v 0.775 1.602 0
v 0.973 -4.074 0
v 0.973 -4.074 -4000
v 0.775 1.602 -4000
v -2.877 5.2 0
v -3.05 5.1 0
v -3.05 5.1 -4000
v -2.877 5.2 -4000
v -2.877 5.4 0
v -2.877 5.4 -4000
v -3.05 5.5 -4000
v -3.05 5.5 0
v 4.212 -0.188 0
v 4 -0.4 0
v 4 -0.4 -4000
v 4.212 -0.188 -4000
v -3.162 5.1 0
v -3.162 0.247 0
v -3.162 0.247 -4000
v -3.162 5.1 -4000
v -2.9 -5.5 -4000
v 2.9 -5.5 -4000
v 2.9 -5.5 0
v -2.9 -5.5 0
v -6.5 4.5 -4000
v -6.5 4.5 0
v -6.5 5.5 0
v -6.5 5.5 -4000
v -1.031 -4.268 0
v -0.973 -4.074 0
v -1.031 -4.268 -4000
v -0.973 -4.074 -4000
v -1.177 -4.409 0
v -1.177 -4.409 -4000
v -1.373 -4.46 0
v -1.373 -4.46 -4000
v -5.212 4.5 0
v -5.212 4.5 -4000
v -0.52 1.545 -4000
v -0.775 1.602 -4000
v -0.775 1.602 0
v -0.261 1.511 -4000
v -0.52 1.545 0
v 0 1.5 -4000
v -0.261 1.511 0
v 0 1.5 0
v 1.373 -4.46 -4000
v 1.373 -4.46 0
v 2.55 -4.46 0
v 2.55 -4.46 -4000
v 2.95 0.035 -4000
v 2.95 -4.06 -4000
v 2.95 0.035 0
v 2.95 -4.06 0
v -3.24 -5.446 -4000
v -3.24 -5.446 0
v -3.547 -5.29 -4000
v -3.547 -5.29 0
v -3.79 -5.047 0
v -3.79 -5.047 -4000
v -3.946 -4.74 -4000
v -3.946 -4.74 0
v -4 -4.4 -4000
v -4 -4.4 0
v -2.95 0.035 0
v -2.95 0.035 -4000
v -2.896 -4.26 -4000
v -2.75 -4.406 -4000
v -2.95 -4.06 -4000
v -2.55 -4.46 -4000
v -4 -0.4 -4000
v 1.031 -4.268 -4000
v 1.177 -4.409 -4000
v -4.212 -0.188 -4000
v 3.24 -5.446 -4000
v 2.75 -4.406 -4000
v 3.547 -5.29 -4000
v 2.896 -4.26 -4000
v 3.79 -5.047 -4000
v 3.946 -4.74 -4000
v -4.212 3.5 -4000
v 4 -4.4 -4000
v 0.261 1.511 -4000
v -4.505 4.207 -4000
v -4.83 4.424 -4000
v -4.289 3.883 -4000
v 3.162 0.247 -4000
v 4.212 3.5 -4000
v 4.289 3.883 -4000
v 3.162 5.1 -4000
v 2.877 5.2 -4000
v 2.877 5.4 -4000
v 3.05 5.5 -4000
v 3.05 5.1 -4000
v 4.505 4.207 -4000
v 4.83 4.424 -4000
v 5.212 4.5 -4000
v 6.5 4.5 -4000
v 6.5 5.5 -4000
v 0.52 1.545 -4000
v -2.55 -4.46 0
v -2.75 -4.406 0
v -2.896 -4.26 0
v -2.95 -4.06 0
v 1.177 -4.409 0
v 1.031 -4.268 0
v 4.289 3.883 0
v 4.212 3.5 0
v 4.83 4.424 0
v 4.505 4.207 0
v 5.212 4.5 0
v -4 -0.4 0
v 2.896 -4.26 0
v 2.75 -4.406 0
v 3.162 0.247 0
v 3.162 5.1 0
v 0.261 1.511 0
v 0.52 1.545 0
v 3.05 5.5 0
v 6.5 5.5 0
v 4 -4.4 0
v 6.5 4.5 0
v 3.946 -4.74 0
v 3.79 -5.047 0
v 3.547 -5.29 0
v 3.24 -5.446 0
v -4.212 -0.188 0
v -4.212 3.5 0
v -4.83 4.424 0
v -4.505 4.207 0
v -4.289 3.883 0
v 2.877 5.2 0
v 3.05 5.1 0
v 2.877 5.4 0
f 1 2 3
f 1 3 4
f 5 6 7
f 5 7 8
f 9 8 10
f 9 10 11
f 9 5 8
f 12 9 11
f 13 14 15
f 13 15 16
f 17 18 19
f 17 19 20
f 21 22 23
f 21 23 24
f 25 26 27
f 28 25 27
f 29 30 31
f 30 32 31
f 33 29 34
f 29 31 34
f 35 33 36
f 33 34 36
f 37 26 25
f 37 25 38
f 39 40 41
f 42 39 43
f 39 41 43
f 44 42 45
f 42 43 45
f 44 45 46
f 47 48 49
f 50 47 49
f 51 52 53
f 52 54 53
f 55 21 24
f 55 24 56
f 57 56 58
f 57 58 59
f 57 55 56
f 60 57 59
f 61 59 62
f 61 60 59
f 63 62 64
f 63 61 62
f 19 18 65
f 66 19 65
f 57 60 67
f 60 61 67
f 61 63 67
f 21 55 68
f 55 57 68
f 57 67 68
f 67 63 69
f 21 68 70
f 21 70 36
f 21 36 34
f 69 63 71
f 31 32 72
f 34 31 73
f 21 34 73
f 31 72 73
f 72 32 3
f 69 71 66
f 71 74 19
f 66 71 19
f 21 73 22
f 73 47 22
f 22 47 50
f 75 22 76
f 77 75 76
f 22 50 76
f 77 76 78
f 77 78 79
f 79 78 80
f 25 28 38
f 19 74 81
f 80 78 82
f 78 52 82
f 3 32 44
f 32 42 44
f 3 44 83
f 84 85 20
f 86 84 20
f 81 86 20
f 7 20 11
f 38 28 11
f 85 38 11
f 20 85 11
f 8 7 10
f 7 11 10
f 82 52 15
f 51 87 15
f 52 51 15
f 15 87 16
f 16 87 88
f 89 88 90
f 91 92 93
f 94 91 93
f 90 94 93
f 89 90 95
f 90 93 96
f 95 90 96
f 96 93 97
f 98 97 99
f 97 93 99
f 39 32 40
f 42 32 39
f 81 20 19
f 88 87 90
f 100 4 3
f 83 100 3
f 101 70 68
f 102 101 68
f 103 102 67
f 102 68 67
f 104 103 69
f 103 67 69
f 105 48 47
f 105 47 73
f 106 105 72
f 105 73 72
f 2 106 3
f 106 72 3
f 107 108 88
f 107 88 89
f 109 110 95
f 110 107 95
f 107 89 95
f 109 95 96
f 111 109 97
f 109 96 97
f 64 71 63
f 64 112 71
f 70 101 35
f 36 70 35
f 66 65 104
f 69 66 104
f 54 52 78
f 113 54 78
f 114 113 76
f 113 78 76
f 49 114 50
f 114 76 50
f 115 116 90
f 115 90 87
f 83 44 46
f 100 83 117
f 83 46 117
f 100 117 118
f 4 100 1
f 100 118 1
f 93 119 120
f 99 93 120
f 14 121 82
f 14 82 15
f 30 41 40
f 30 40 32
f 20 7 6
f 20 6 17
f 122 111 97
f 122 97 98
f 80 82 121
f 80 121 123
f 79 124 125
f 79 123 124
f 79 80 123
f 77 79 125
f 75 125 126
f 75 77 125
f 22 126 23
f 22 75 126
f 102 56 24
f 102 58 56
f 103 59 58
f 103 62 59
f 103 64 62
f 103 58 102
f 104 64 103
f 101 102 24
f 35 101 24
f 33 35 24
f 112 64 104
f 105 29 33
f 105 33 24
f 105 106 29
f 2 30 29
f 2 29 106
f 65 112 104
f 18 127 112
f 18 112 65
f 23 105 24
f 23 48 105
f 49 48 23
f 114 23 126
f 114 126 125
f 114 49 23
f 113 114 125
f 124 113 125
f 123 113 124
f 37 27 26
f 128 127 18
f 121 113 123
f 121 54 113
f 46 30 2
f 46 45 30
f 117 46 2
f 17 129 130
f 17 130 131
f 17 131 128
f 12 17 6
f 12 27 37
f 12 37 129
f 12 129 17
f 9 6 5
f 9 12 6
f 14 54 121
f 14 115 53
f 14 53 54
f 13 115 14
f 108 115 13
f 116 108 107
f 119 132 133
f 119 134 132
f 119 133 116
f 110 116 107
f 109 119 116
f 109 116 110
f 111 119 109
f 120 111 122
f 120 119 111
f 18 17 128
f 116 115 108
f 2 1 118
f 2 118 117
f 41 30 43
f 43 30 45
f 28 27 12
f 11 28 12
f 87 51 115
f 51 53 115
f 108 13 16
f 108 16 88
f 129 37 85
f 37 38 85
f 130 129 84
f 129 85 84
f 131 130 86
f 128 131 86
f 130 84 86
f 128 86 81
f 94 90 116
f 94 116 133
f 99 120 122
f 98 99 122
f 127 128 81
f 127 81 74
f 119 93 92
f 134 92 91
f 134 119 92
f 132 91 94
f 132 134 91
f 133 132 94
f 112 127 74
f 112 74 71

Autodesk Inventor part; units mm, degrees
ref_plane "YZ Plane" through (0, 0, 0) normal (1, 0, 0) x (0, 1, 0)
ref_plane "XY Plane" through (0, 0, 0) normal (0, 0, 1) x (1, 0, 0)
sketch "Sketch1" plane through (0, 0, 0) normal (0, 0, 1) x (1, 0, 0)
  line L0 (-6.5, 5.5) -> (6.5, 5.5)
  line L1 (6.5, 5.5) -> (6.5, -5.5)
  line L2 (6.5, -5.5) -> (-6.5, -5.5)
  line L3 (-6.5, -5.5) -> (-6.5, 5.5)
  point P0 (0, 0)
  dimension "d0" = 13
  dimension "d1" = 11
  dimension "d2" = 6.5
  dimension "d3" = 5.5
extrude "Extrusion1" add sketch "Sketch1" against normal blind 4000
sketch "Sketch2" plane through (0, 0, 0) normal (0, 0, 1) x (1, 0, 0)
  line L0 (-6.5, 5.5) -> (6.5, 5.5) projected
  line L1 (-6.5, -5.5) -> (-6.5, 5.5) projected
  line L2 (6.5, -5.5) -> (-6.5, -5.5) projected
  line L3 (6.5, 5.5) -> (6.5, -5.5) projected
  line L4 (-6.5, 4.5) -> (-4.2125, 4.5)
  line L5 (-4.2125, 4.5) -> (-4.2125, -0.1875)
  line L6 (-4.2125, -0.1875) -> (-4, -0.4)
  line L7 (-4, -0.4) -> (-4, -5.5)
  line L8 (0, 7.7) -> (0, -7.7) projected
  line L9 (-6.5, 4.5) -> (-6.5, -5.5)
  line L10 (-6.5, -5.5) -> (-4, -5.5)
  dimension "d6" = 1
  dimension "d7" = 8.425
  dimension "d8" = 8
  dimension "d9" = 135
  dimension "d10" = 5.1
extrude "Extrusion2" cut sketch "Sketch2" against normal through all contours L4 L5 L6 L7 L2 L1
fillet "Fillet1" radius 1 1 edges at (-4.2125, 4.5, -2000)
fillet "Fillet1" radius 1.1 1 edges at (-4, -5.5, -2000)
mirror "Mirror1" about plane through (0, 0, 0) normal (1, 0, 0) of "Extrusion2", "Fillet1"
sketch "Sketch3" plane through (0, 0, 0) normal (0, 0, 1) x (1, 0, 0)
  line L0 (-6.5, 5.5) -> (6.5, 5.5) projected
  line L1 (-4.2125, 3.5) -> (-4.2125, -0.1875) projected
  line L2 (-4.2125, -0.1875) -> (-4, -0.4) projected
  line L3 (-4, -0.4) -> (-4, -4.4) projected
  line L4 (2.9, -5.5) -> (-2.9, -5.5) projected
  arc A0 (-3.05, 5.1) -> (-3.05, 5.5) centre (-3.05, 5.3) ccw
  line L5 (-3.1625, 0.2474) -> (-2.95, 0.0349)
  line L6 (-2.95, 0.0349) -> (-2.95, -4.46)
  line L7 (-2.95, -4.46) -> (-0.9867, -4.46)
  line L8 (0, 7.7) -> (0, -7.7) projected
  line L9 (-3.1625, 0.2474) -> (-3.1625, 5.1)
  line L10 (-3.05, 5.1) -> (-3.1625, 5.1)
  line L11 (-0.775, 1.6018) -> (-0.9867, -4.46)
  line L12 (0, 1.5) -> (0, -5.5)
  arc A1 (-0.775, 1.6018) -> (0, 1.5) centre (0, 4.5) ccw
  line L13 (0, 1.5) -> (0, 5.5)
  line L14 (0, 5.5) -> (-3.05, 5.5)
  dimension "d15" = 0.4
  dimension "d16" = 1
  dimension "d18" = 5.7
  dimension "d19" = 1.05
  dimension "d20" = 1.05
  dimension "d21" = 1.05
  dimension "d22" = 92
  dimension "d23" = 1.04
  dimension "d24" = 1.55
  dimension "d25" = 3
extrude "Extrusion3" cut sketch "Sketch3" against normal through all
mirror "Mirror2" about plane through (0, 0, 0) normal (1, 0, 0) of "Extrusion3"
fillet "Fillet2" radius 0.4 4 edges at (-2.95, -4.46, -2000) (-0.9867, -4.46, -2000) (0.9867, -4.46, -2000) (2.95, -4.46, -2000)
ref_plane "Side1" through (-6.5, 4.5, 0) normal (0, -1, 0) x (1, 0, 0)
ref_plane "T-Slot1" through (0, 5.5, 0) normal (1, 0, 0) x (0, 0, -1)
ref_plane "Side3" through (-6.5, 5.5, 0) normal (0, 1, 0) x (-1, 0, 0)
ref_plane "Side2" through (6.5, 5.5, 0) normal (1, 0, 0) x (0, 1, 0)
ref_plane "Piano di lavoro5" through (0, 1.5, 0) normal (0, 1, 0) x (-1, 0, 0)
equation "\"d2\" = 0.5 * d0"
equation "\"d3\" = 0.5 * d1"
equation "\"d4\" = Ex_Length"
equation "\"Ex_Length\" = 4000"
properties part number "13-106" material "Alluminio - 6061"
